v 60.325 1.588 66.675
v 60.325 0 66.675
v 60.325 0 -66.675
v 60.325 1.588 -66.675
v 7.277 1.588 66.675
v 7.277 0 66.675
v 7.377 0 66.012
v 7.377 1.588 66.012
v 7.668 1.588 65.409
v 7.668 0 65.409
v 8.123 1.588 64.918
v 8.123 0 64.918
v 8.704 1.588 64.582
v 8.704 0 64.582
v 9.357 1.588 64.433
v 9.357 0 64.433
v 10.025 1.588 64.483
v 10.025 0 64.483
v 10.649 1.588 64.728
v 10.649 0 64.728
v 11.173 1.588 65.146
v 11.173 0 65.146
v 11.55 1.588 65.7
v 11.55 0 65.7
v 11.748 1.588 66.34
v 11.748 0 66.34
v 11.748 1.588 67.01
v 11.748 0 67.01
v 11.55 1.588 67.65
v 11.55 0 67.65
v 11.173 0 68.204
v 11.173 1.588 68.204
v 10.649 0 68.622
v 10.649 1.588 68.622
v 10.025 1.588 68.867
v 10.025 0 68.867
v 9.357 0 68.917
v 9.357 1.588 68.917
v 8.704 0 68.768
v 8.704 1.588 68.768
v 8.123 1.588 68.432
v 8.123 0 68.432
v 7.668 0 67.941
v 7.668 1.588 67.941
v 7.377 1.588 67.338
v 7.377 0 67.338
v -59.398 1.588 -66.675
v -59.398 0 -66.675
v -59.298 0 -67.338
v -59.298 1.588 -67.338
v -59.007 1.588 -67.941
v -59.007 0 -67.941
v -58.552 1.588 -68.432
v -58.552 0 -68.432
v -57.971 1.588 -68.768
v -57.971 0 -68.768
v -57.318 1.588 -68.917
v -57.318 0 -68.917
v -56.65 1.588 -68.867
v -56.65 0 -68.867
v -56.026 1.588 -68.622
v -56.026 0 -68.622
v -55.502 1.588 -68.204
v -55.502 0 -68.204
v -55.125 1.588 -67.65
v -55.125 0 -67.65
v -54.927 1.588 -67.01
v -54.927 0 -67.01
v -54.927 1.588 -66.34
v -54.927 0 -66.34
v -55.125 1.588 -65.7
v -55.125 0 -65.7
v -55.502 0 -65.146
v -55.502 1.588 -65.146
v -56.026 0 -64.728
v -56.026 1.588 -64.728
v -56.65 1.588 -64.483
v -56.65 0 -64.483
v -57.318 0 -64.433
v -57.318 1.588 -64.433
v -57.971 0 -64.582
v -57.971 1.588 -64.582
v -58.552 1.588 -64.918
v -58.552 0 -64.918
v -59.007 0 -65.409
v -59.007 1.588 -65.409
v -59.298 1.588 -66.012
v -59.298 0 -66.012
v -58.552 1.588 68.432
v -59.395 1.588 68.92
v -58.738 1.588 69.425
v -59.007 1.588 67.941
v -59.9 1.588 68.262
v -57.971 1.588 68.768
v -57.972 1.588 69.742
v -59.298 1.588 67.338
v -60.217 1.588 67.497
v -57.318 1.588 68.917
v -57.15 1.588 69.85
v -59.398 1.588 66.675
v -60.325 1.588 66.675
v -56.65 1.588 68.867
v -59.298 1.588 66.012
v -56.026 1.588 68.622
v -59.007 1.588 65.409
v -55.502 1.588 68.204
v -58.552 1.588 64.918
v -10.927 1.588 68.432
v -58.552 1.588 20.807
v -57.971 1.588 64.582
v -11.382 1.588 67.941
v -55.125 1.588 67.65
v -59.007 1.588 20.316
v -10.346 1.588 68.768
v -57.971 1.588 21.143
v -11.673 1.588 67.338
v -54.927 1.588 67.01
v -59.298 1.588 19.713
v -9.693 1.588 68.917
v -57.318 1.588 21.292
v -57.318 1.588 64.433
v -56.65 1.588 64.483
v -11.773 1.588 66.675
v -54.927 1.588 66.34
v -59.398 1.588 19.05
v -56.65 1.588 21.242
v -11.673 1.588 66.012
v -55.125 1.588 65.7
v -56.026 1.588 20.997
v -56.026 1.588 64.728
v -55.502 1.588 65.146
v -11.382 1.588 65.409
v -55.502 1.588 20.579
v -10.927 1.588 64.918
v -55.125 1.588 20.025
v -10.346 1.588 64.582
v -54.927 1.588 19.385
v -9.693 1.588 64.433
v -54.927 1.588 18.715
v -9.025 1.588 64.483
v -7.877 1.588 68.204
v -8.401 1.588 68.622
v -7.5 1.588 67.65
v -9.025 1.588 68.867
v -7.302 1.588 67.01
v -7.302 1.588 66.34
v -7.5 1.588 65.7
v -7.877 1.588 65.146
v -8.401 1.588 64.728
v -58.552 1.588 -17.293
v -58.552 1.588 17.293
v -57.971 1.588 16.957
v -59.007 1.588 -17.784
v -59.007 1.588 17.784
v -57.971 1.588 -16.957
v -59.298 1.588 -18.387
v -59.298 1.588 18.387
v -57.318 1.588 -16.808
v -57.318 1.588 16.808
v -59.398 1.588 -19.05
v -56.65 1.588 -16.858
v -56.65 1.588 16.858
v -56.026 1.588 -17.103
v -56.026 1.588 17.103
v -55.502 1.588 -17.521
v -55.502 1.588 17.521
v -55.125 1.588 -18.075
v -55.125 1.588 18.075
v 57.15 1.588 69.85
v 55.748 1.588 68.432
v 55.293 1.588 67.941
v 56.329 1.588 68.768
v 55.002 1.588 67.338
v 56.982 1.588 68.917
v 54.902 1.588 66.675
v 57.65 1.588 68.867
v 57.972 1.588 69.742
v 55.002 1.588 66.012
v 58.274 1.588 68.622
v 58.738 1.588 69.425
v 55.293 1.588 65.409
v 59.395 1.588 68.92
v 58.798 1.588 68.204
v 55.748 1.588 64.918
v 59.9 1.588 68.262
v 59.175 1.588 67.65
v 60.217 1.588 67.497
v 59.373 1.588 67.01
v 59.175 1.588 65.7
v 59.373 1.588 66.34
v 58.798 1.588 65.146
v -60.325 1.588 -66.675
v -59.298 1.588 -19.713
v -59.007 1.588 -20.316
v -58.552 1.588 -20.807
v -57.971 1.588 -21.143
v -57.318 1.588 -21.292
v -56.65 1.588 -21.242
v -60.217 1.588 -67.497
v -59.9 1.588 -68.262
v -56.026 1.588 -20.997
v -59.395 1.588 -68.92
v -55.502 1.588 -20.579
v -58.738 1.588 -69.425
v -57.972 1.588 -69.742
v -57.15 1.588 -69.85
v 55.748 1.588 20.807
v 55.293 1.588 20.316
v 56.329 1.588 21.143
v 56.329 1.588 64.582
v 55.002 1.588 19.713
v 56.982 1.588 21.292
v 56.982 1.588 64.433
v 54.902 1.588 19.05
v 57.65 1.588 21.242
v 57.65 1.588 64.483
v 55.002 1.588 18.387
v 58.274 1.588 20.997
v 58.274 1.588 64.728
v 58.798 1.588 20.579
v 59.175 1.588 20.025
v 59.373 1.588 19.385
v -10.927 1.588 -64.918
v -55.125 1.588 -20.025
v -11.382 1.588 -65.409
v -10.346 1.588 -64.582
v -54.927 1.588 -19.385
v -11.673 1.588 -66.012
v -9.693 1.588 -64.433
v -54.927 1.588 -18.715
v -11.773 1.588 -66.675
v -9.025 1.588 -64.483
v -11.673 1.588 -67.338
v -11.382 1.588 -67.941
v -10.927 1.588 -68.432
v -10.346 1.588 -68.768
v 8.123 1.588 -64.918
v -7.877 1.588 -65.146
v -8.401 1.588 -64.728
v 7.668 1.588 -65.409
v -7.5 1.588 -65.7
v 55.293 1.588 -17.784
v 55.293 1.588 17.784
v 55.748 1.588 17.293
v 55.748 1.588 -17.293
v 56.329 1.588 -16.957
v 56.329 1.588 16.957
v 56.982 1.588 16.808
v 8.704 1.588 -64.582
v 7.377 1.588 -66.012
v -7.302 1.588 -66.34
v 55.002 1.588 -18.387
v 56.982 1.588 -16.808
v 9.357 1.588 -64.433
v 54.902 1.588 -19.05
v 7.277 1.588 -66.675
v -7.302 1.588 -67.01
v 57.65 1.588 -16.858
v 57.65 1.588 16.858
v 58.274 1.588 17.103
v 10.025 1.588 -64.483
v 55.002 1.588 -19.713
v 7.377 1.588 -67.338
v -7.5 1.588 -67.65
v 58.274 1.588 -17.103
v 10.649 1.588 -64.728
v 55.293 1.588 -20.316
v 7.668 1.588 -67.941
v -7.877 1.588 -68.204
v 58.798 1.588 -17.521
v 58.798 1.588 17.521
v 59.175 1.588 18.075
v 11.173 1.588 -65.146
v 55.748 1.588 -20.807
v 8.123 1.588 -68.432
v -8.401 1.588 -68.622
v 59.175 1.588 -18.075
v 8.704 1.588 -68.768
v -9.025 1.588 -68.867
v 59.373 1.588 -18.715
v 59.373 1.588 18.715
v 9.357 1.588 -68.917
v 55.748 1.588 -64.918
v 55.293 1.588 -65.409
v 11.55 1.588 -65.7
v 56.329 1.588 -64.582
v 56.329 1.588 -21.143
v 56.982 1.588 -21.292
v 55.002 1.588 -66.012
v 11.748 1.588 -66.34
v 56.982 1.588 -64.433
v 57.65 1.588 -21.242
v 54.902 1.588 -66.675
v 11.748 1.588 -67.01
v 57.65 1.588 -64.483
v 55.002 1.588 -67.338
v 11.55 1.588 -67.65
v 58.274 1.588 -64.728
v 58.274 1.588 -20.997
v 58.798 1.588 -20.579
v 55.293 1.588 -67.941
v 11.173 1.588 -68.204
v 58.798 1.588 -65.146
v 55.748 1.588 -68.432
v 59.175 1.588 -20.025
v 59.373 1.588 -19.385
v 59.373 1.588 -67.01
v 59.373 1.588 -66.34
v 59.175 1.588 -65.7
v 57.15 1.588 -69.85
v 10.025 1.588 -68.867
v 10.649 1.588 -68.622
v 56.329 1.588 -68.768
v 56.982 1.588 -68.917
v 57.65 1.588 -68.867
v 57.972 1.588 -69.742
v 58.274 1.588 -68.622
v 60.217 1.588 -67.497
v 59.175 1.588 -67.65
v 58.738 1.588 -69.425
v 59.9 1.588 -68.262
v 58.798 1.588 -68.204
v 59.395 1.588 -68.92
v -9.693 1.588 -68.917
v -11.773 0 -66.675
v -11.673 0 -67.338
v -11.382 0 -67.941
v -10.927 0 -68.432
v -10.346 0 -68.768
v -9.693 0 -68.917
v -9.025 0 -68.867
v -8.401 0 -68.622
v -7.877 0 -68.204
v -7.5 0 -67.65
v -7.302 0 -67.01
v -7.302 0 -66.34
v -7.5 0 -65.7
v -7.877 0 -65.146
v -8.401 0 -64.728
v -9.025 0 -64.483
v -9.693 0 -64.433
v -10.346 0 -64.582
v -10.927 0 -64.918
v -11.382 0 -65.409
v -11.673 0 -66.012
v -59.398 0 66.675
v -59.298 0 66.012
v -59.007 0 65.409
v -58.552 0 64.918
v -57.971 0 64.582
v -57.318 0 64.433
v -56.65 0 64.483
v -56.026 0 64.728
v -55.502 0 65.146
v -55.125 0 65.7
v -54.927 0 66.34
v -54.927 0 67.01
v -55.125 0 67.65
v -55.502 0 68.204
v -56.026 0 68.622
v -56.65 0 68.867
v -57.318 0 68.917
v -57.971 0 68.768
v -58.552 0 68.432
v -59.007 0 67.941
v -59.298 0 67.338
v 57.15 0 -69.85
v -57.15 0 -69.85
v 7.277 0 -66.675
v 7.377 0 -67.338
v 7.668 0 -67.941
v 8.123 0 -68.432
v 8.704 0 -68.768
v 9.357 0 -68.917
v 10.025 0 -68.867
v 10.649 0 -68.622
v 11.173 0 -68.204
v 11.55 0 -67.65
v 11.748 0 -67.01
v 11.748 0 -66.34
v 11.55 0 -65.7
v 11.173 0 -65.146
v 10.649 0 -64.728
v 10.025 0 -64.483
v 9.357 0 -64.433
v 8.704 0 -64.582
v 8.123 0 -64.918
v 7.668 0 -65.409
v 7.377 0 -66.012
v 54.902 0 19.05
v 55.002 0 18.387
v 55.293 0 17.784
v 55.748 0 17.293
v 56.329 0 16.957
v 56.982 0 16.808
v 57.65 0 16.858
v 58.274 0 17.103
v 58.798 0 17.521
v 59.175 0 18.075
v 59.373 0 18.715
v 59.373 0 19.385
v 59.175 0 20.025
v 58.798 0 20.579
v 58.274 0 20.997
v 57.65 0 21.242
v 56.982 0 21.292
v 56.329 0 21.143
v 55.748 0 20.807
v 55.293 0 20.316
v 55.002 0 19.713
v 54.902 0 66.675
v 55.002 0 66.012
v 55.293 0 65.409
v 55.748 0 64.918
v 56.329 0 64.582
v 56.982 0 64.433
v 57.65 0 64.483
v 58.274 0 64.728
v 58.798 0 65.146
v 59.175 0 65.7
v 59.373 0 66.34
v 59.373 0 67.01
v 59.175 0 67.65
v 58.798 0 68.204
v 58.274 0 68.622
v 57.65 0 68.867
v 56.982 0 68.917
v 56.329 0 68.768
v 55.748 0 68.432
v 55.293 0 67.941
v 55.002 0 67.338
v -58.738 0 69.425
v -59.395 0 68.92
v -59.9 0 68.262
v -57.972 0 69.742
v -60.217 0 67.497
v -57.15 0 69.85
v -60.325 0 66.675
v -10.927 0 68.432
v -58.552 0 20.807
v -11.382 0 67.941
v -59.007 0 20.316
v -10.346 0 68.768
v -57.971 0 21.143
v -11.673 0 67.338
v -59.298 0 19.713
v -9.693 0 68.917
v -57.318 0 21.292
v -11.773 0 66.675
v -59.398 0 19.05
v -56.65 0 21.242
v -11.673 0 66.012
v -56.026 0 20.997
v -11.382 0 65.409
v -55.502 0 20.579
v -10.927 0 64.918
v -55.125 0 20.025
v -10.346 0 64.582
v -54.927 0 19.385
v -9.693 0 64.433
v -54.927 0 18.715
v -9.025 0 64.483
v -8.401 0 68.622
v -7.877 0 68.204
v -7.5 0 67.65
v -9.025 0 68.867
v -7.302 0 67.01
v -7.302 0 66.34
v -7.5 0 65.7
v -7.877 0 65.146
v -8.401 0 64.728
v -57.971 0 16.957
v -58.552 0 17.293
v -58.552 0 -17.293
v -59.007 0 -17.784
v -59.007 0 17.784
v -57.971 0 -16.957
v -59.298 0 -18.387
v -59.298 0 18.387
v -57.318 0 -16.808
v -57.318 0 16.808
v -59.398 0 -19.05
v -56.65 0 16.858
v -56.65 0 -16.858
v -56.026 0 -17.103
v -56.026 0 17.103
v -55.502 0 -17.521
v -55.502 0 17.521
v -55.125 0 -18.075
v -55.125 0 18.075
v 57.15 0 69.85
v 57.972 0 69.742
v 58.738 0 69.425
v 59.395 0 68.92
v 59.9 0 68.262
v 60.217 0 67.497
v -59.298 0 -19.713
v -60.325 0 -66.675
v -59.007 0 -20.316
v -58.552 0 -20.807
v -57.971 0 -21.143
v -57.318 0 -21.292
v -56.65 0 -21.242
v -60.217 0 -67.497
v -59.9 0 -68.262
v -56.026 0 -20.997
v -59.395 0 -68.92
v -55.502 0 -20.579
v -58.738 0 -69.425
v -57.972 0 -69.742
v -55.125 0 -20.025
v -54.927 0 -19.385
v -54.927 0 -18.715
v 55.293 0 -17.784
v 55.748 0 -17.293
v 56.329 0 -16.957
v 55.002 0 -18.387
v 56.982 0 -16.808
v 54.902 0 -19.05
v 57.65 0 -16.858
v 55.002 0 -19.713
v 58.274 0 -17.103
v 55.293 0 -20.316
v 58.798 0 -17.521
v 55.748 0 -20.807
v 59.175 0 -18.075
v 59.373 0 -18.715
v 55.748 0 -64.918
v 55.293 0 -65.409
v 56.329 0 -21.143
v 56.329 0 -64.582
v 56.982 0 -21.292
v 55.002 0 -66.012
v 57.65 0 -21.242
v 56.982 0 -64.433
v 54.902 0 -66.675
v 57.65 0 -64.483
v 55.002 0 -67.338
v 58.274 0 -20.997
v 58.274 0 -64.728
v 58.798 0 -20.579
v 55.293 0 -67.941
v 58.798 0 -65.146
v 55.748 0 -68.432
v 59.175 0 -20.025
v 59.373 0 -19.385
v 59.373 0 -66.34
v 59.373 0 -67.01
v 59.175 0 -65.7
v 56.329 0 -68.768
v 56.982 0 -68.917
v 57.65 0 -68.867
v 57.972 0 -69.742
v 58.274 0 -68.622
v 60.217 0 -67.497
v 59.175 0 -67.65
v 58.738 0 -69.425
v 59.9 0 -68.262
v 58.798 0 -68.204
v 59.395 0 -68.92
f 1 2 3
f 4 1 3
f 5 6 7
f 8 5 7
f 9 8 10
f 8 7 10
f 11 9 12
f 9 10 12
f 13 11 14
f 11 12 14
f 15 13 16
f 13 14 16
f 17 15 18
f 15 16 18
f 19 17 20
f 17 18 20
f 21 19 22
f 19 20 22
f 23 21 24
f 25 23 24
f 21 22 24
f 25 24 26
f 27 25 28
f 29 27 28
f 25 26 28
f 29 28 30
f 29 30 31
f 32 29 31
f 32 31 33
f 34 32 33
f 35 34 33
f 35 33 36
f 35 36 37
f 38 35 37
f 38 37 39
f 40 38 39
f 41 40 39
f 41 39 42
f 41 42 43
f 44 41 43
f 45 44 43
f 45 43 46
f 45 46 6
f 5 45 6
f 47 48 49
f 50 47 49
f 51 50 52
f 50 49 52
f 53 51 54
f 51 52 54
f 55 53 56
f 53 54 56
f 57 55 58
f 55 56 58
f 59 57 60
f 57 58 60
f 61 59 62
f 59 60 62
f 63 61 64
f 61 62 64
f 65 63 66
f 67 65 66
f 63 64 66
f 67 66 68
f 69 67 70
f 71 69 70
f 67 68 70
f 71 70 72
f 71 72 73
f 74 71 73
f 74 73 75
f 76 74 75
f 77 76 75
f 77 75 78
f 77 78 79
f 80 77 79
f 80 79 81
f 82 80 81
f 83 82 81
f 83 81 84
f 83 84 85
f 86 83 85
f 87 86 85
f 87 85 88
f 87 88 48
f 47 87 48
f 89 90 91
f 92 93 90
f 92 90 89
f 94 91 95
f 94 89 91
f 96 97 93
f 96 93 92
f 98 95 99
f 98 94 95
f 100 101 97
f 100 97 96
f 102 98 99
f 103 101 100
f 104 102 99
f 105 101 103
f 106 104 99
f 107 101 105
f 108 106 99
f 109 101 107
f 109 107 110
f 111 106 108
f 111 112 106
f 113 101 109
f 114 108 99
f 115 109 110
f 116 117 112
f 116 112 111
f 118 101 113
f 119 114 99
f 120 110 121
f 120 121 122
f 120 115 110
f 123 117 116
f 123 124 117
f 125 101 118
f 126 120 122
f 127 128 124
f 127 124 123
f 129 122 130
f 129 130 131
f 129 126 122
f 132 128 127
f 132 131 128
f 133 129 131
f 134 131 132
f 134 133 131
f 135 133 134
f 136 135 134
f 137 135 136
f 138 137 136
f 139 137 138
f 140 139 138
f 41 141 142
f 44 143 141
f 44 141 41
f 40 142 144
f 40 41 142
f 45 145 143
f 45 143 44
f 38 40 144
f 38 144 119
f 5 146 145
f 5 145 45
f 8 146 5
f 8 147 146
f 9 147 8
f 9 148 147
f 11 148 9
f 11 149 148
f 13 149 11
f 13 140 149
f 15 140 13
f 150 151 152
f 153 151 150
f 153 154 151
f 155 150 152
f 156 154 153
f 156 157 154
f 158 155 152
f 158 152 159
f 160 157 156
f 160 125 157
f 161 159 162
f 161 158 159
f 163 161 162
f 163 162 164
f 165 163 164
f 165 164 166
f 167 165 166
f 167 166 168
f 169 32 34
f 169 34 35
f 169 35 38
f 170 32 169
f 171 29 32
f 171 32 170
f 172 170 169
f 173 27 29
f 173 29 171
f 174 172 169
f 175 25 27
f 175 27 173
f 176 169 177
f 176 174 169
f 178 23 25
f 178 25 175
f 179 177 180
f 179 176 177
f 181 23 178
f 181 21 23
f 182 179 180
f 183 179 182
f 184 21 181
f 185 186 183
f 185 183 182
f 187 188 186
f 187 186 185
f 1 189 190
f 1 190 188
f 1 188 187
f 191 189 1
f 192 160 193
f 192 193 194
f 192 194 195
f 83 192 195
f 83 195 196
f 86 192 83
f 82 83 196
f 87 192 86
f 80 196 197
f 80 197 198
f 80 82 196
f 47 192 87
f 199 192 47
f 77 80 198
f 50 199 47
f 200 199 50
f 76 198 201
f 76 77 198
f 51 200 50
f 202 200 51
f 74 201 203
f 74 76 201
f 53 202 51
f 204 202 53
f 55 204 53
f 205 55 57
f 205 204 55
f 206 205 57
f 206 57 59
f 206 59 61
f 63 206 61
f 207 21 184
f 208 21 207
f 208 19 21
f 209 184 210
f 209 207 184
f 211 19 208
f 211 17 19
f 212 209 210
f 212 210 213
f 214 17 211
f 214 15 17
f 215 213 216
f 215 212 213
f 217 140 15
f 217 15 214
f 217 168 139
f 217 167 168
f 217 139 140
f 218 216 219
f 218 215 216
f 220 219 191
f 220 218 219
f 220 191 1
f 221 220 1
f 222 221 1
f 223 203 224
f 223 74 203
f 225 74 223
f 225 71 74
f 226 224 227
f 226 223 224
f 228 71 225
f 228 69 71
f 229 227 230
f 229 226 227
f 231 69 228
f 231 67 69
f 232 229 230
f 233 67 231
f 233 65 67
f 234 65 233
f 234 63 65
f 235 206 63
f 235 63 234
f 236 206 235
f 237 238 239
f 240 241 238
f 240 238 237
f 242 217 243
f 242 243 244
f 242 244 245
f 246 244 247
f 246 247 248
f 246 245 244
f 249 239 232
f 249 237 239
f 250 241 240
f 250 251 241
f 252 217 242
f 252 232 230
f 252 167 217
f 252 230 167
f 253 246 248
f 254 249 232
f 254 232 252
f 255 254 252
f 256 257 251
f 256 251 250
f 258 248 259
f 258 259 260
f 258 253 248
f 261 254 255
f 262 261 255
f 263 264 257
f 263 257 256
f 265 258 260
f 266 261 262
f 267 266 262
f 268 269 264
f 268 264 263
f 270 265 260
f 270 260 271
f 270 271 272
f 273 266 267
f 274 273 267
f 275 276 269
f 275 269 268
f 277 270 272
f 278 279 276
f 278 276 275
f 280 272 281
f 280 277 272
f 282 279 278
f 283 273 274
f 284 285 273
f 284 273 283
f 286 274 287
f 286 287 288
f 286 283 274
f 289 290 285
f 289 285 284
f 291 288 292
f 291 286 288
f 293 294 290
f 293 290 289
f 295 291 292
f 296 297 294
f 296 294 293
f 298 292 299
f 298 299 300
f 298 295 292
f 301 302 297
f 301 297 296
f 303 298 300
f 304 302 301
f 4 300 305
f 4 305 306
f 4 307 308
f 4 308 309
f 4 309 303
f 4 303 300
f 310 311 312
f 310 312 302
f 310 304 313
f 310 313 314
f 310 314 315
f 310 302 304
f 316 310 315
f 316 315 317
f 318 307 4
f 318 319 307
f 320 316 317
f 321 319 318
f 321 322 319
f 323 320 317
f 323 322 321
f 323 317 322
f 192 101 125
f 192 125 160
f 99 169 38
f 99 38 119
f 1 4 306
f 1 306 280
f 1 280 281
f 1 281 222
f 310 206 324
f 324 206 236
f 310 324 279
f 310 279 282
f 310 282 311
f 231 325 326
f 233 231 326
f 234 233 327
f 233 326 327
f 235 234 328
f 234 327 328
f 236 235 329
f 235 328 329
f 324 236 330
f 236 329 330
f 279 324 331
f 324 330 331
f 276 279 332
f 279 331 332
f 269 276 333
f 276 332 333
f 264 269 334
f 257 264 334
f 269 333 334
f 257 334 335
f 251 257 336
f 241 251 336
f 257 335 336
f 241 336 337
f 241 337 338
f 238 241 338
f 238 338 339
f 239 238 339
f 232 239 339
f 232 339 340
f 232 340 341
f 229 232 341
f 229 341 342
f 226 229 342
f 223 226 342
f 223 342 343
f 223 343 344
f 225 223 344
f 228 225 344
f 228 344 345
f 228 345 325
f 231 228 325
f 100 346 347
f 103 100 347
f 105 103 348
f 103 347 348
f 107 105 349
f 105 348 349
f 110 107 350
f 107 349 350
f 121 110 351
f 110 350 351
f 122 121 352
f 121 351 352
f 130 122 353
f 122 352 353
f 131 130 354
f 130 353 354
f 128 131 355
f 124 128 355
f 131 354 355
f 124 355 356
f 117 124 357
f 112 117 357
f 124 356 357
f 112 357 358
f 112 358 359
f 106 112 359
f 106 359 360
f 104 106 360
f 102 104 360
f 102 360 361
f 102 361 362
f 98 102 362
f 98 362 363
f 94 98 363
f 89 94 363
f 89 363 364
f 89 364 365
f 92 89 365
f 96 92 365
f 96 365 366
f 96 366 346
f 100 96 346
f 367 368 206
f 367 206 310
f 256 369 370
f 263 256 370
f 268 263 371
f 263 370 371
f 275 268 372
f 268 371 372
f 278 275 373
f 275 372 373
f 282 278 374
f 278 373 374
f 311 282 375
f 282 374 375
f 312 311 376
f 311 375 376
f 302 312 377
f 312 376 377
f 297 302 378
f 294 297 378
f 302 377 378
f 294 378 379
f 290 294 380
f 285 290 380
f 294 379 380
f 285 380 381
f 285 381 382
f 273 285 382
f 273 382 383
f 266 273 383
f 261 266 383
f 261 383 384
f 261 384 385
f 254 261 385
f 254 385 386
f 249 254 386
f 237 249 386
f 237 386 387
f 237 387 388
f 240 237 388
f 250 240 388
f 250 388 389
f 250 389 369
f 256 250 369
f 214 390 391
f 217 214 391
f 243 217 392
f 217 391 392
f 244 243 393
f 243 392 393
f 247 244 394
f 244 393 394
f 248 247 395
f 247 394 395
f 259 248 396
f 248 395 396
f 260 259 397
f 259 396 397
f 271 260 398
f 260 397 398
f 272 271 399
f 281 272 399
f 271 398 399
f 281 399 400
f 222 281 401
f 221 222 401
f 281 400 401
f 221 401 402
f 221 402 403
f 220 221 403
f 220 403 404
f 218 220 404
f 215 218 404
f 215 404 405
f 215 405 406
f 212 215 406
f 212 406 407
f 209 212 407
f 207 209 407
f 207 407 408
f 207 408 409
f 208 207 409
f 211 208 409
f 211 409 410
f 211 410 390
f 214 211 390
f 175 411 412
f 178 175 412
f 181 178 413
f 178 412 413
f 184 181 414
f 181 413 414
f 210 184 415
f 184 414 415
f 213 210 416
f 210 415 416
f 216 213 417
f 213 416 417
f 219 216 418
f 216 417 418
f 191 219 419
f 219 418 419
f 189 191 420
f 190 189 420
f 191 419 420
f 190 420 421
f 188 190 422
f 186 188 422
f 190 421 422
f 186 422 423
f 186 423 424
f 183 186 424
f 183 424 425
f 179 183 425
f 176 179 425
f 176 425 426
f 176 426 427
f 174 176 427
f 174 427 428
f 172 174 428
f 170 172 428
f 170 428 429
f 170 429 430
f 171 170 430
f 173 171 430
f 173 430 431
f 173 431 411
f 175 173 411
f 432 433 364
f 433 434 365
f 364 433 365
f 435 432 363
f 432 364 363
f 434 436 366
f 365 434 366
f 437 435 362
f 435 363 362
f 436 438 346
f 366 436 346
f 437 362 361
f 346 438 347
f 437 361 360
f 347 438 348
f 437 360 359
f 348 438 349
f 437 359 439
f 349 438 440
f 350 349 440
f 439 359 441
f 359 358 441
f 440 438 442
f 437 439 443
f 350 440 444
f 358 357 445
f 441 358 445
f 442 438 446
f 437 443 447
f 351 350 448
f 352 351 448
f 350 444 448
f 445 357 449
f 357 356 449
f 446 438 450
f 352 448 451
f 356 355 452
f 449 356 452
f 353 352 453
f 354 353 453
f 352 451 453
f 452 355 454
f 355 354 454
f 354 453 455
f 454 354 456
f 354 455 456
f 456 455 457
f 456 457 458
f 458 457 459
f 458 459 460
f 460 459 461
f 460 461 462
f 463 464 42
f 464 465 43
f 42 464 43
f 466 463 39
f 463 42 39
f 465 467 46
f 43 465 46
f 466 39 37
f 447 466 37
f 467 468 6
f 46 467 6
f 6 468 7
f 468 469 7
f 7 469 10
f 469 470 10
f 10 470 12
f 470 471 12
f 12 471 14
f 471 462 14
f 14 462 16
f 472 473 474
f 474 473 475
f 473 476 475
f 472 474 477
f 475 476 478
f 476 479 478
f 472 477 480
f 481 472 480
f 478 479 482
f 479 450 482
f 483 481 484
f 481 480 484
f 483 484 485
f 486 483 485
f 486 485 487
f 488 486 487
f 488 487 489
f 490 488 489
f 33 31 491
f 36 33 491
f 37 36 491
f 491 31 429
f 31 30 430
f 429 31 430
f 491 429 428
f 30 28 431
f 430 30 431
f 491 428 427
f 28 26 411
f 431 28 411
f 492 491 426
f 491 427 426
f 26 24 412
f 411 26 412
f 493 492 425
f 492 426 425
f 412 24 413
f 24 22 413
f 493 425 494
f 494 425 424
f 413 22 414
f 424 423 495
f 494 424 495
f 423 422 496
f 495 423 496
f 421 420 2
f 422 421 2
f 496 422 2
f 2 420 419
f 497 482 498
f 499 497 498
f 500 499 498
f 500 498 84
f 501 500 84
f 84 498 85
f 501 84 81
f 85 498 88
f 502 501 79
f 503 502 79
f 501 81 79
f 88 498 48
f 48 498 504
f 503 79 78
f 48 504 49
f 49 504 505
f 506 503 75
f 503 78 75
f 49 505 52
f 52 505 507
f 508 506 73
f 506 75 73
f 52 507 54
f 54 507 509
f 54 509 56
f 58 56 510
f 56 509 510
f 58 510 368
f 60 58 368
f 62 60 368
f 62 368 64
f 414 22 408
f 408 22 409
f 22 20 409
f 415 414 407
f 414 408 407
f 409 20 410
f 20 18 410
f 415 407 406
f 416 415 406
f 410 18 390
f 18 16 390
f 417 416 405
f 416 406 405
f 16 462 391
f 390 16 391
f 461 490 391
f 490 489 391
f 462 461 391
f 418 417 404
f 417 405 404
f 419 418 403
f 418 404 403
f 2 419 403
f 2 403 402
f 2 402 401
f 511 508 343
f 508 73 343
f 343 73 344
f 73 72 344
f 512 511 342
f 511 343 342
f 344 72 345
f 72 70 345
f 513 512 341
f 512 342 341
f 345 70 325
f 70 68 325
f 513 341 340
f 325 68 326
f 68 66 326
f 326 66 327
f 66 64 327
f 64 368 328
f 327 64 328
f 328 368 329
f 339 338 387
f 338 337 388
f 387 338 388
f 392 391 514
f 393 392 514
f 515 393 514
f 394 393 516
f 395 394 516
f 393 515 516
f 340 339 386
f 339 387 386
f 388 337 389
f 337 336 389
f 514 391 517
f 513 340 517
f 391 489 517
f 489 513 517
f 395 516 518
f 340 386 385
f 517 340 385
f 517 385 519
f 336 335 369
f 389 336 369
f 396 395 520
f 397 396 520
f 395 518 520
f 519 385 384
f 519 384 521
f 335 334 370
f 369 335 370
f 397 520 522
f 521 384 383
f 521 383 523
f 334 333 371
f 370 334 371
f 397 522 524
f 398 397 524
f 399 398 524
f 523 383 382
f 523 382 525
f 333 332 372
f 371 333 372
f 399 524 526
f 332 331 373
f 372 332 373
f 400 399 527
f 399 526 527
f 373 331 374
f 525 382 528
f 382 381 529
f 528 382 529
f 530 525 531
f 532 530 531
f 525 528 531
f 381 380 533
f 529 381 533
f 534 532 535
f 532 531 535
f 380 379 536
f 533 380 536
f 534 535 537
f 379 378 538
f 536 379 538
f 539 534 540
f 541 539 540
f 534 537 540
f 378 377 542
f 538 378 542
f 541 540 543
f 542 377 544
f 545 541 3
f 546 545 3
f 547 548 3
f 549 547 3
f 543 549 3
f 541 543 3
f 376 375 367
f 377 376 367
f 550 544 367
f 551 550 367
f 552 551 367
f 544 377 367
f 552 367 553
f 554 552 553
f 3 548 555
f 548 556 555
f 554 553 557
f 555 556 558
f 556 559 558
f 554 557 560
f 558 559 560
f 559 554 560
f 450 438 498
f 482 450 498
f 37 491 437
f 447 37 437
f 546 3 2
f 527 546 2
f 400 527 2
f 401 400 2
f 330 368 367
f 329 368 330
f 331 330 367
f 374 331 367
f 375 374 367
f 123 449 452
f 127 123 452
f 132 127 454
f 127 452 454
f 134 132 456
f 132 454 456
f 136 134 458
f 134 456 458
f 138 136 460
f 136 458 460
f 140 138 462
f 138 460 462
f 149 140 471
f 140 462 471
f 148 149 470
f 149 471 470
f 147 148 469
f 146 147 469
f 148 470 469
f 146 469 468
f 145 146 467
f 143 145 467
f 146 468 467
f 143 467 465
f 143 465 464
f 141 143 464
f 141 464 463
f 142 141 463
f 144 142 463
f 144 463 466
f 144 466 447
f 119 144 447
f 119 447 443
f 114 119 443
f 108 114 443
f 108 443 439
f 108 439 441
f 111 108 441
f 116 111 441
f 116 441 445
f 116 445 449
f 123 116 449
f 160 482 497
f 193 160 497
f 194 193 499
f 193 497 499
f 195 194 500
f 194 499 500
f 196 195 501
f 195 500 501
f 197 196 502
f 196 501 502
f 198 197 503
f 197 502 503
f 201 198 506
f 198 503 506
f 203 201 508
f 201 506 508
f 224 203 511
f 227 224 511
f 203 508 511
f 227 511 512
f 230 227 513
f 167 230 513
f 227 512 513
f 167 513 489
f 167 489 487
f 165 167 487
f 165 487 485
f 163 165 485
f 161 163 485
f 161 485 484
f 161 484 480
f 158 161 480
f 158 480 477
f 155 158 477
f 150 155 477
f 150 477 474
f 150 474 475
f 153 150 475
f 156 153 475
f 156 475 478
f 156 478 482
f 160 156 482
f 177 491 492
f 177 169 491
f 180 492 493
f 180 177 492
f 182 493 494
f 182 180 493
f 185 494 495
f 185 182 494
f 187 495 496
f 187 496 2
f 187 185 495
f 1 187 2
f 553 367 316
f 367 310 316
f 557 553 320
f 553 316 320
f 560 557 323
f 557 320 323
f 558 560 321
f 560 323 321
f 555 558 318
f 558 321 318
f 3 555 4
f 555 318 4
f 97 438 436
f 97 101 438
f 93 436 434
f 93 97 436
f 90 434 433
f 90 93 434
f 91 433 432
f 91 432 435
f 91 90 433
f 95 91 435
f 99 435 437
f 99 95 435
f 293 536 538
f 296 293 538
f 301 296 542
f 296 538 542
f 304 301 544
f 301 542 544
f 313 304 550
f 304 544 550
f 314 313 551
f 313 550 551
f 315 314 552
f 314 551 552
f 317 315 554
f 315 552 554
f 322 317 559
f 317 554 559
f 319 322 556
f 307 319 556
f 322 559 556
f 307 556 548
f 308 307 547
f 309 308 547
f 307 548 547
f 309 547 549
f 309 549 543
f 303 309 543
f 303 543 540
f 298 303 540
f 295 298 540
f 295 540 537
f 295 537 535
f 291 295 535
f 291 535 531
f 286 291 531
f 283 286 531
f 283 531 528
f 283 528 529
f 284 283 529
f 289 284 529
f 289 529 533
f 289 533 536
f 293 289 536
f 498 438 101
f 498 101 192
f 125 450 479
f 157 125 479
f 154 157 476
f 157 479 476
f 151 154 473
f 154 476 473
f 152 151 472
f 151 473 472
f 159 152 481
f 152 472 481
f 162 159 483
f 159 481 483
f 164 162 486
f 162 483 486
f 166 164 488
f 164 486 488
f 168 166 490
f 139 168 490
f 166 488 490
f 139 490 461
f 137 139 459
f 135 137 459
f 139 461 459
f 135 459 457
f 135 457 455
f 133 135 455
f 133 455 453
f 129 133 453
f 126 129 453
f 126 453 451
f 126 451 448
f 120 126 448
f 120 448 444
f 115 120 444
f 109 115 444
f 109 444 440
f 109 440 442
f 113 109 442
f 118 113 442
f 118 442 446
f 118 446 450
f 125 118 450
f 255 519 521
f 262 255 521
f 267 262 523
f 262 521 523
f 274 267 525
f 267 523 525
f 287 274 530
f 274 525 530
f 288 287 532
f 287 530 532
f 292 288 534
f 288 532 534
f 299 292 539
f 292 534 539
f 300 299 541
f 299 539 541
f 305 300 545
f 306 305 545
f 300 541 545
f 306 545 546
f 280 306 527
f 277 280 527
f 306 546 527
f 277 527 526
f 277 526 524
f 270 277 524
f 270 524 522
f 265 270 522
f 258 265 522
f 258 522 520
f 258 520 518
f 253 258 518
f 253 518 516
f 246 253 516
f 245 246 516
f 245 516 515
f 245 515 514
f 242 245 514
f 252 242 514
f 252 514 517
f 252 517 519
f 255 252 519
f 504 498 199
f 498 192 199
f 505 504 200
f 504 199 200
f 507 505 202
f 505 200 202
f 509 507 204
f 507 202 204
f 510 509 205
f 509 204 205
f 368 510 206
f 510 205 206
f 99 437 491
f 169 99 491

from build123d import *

# Parameters (mm, degrees)
SKETCH1_W             = 120.65
SKETCH1_H             = 139.7
BOSS_EXTRUDE1_DEPTH   = 1.5875
F_8_CLEARANCE_HOLE1_D = 4.4958
FILLET1_R             = 3.175


with BuildPart() as part:
    # Sketch1 → Boss-Extrude1 (new body)
    with BuildSketch(Plane(origin=(0, 0, 0), x_dir=(1, 0, 0), z_dir=(0, 1, 0))):
        Rectangle(SKETCH1_W, SKETCH1_H)
    extrude(amount=BOSS_EXTRUDE1_DEPTH)

    # #8 Clearance Hole1 (through all)
    with Locations(Plane(origin=(0, 1.5875, 0), x_dir=(1, 0, 0), z_dir=(0, 1, 0))):
        with Locations((-57.15, 66.675), (-57.15, 19.05), (-57.15, -19.05), (-57.15, -66.675), (-9.525, -66.675), (9.525, -66.675), (57.15, -66.675), (57.15, -19.05), (57.15, 19.05), (57.15, 66.675), (9.525, 66.675), (-9.525, 66.675)):
            Hole(F_8_CLEARANCE_HOLE1_D / 2)

    # Fillet1
    fillet1_edges = [part.edges().sort_by_distance(p)[0] for p in [
        (-60.325, 0.79375, -69.85),
        (60.325, 0.79375, -69.85),
        (60.325, 0.79375, 69.85),
        (-60.325, 0.79375, 69.85),
    ]]
    fillet(fillet1_edges, radius=FILLET1_R)


solid = part.part
